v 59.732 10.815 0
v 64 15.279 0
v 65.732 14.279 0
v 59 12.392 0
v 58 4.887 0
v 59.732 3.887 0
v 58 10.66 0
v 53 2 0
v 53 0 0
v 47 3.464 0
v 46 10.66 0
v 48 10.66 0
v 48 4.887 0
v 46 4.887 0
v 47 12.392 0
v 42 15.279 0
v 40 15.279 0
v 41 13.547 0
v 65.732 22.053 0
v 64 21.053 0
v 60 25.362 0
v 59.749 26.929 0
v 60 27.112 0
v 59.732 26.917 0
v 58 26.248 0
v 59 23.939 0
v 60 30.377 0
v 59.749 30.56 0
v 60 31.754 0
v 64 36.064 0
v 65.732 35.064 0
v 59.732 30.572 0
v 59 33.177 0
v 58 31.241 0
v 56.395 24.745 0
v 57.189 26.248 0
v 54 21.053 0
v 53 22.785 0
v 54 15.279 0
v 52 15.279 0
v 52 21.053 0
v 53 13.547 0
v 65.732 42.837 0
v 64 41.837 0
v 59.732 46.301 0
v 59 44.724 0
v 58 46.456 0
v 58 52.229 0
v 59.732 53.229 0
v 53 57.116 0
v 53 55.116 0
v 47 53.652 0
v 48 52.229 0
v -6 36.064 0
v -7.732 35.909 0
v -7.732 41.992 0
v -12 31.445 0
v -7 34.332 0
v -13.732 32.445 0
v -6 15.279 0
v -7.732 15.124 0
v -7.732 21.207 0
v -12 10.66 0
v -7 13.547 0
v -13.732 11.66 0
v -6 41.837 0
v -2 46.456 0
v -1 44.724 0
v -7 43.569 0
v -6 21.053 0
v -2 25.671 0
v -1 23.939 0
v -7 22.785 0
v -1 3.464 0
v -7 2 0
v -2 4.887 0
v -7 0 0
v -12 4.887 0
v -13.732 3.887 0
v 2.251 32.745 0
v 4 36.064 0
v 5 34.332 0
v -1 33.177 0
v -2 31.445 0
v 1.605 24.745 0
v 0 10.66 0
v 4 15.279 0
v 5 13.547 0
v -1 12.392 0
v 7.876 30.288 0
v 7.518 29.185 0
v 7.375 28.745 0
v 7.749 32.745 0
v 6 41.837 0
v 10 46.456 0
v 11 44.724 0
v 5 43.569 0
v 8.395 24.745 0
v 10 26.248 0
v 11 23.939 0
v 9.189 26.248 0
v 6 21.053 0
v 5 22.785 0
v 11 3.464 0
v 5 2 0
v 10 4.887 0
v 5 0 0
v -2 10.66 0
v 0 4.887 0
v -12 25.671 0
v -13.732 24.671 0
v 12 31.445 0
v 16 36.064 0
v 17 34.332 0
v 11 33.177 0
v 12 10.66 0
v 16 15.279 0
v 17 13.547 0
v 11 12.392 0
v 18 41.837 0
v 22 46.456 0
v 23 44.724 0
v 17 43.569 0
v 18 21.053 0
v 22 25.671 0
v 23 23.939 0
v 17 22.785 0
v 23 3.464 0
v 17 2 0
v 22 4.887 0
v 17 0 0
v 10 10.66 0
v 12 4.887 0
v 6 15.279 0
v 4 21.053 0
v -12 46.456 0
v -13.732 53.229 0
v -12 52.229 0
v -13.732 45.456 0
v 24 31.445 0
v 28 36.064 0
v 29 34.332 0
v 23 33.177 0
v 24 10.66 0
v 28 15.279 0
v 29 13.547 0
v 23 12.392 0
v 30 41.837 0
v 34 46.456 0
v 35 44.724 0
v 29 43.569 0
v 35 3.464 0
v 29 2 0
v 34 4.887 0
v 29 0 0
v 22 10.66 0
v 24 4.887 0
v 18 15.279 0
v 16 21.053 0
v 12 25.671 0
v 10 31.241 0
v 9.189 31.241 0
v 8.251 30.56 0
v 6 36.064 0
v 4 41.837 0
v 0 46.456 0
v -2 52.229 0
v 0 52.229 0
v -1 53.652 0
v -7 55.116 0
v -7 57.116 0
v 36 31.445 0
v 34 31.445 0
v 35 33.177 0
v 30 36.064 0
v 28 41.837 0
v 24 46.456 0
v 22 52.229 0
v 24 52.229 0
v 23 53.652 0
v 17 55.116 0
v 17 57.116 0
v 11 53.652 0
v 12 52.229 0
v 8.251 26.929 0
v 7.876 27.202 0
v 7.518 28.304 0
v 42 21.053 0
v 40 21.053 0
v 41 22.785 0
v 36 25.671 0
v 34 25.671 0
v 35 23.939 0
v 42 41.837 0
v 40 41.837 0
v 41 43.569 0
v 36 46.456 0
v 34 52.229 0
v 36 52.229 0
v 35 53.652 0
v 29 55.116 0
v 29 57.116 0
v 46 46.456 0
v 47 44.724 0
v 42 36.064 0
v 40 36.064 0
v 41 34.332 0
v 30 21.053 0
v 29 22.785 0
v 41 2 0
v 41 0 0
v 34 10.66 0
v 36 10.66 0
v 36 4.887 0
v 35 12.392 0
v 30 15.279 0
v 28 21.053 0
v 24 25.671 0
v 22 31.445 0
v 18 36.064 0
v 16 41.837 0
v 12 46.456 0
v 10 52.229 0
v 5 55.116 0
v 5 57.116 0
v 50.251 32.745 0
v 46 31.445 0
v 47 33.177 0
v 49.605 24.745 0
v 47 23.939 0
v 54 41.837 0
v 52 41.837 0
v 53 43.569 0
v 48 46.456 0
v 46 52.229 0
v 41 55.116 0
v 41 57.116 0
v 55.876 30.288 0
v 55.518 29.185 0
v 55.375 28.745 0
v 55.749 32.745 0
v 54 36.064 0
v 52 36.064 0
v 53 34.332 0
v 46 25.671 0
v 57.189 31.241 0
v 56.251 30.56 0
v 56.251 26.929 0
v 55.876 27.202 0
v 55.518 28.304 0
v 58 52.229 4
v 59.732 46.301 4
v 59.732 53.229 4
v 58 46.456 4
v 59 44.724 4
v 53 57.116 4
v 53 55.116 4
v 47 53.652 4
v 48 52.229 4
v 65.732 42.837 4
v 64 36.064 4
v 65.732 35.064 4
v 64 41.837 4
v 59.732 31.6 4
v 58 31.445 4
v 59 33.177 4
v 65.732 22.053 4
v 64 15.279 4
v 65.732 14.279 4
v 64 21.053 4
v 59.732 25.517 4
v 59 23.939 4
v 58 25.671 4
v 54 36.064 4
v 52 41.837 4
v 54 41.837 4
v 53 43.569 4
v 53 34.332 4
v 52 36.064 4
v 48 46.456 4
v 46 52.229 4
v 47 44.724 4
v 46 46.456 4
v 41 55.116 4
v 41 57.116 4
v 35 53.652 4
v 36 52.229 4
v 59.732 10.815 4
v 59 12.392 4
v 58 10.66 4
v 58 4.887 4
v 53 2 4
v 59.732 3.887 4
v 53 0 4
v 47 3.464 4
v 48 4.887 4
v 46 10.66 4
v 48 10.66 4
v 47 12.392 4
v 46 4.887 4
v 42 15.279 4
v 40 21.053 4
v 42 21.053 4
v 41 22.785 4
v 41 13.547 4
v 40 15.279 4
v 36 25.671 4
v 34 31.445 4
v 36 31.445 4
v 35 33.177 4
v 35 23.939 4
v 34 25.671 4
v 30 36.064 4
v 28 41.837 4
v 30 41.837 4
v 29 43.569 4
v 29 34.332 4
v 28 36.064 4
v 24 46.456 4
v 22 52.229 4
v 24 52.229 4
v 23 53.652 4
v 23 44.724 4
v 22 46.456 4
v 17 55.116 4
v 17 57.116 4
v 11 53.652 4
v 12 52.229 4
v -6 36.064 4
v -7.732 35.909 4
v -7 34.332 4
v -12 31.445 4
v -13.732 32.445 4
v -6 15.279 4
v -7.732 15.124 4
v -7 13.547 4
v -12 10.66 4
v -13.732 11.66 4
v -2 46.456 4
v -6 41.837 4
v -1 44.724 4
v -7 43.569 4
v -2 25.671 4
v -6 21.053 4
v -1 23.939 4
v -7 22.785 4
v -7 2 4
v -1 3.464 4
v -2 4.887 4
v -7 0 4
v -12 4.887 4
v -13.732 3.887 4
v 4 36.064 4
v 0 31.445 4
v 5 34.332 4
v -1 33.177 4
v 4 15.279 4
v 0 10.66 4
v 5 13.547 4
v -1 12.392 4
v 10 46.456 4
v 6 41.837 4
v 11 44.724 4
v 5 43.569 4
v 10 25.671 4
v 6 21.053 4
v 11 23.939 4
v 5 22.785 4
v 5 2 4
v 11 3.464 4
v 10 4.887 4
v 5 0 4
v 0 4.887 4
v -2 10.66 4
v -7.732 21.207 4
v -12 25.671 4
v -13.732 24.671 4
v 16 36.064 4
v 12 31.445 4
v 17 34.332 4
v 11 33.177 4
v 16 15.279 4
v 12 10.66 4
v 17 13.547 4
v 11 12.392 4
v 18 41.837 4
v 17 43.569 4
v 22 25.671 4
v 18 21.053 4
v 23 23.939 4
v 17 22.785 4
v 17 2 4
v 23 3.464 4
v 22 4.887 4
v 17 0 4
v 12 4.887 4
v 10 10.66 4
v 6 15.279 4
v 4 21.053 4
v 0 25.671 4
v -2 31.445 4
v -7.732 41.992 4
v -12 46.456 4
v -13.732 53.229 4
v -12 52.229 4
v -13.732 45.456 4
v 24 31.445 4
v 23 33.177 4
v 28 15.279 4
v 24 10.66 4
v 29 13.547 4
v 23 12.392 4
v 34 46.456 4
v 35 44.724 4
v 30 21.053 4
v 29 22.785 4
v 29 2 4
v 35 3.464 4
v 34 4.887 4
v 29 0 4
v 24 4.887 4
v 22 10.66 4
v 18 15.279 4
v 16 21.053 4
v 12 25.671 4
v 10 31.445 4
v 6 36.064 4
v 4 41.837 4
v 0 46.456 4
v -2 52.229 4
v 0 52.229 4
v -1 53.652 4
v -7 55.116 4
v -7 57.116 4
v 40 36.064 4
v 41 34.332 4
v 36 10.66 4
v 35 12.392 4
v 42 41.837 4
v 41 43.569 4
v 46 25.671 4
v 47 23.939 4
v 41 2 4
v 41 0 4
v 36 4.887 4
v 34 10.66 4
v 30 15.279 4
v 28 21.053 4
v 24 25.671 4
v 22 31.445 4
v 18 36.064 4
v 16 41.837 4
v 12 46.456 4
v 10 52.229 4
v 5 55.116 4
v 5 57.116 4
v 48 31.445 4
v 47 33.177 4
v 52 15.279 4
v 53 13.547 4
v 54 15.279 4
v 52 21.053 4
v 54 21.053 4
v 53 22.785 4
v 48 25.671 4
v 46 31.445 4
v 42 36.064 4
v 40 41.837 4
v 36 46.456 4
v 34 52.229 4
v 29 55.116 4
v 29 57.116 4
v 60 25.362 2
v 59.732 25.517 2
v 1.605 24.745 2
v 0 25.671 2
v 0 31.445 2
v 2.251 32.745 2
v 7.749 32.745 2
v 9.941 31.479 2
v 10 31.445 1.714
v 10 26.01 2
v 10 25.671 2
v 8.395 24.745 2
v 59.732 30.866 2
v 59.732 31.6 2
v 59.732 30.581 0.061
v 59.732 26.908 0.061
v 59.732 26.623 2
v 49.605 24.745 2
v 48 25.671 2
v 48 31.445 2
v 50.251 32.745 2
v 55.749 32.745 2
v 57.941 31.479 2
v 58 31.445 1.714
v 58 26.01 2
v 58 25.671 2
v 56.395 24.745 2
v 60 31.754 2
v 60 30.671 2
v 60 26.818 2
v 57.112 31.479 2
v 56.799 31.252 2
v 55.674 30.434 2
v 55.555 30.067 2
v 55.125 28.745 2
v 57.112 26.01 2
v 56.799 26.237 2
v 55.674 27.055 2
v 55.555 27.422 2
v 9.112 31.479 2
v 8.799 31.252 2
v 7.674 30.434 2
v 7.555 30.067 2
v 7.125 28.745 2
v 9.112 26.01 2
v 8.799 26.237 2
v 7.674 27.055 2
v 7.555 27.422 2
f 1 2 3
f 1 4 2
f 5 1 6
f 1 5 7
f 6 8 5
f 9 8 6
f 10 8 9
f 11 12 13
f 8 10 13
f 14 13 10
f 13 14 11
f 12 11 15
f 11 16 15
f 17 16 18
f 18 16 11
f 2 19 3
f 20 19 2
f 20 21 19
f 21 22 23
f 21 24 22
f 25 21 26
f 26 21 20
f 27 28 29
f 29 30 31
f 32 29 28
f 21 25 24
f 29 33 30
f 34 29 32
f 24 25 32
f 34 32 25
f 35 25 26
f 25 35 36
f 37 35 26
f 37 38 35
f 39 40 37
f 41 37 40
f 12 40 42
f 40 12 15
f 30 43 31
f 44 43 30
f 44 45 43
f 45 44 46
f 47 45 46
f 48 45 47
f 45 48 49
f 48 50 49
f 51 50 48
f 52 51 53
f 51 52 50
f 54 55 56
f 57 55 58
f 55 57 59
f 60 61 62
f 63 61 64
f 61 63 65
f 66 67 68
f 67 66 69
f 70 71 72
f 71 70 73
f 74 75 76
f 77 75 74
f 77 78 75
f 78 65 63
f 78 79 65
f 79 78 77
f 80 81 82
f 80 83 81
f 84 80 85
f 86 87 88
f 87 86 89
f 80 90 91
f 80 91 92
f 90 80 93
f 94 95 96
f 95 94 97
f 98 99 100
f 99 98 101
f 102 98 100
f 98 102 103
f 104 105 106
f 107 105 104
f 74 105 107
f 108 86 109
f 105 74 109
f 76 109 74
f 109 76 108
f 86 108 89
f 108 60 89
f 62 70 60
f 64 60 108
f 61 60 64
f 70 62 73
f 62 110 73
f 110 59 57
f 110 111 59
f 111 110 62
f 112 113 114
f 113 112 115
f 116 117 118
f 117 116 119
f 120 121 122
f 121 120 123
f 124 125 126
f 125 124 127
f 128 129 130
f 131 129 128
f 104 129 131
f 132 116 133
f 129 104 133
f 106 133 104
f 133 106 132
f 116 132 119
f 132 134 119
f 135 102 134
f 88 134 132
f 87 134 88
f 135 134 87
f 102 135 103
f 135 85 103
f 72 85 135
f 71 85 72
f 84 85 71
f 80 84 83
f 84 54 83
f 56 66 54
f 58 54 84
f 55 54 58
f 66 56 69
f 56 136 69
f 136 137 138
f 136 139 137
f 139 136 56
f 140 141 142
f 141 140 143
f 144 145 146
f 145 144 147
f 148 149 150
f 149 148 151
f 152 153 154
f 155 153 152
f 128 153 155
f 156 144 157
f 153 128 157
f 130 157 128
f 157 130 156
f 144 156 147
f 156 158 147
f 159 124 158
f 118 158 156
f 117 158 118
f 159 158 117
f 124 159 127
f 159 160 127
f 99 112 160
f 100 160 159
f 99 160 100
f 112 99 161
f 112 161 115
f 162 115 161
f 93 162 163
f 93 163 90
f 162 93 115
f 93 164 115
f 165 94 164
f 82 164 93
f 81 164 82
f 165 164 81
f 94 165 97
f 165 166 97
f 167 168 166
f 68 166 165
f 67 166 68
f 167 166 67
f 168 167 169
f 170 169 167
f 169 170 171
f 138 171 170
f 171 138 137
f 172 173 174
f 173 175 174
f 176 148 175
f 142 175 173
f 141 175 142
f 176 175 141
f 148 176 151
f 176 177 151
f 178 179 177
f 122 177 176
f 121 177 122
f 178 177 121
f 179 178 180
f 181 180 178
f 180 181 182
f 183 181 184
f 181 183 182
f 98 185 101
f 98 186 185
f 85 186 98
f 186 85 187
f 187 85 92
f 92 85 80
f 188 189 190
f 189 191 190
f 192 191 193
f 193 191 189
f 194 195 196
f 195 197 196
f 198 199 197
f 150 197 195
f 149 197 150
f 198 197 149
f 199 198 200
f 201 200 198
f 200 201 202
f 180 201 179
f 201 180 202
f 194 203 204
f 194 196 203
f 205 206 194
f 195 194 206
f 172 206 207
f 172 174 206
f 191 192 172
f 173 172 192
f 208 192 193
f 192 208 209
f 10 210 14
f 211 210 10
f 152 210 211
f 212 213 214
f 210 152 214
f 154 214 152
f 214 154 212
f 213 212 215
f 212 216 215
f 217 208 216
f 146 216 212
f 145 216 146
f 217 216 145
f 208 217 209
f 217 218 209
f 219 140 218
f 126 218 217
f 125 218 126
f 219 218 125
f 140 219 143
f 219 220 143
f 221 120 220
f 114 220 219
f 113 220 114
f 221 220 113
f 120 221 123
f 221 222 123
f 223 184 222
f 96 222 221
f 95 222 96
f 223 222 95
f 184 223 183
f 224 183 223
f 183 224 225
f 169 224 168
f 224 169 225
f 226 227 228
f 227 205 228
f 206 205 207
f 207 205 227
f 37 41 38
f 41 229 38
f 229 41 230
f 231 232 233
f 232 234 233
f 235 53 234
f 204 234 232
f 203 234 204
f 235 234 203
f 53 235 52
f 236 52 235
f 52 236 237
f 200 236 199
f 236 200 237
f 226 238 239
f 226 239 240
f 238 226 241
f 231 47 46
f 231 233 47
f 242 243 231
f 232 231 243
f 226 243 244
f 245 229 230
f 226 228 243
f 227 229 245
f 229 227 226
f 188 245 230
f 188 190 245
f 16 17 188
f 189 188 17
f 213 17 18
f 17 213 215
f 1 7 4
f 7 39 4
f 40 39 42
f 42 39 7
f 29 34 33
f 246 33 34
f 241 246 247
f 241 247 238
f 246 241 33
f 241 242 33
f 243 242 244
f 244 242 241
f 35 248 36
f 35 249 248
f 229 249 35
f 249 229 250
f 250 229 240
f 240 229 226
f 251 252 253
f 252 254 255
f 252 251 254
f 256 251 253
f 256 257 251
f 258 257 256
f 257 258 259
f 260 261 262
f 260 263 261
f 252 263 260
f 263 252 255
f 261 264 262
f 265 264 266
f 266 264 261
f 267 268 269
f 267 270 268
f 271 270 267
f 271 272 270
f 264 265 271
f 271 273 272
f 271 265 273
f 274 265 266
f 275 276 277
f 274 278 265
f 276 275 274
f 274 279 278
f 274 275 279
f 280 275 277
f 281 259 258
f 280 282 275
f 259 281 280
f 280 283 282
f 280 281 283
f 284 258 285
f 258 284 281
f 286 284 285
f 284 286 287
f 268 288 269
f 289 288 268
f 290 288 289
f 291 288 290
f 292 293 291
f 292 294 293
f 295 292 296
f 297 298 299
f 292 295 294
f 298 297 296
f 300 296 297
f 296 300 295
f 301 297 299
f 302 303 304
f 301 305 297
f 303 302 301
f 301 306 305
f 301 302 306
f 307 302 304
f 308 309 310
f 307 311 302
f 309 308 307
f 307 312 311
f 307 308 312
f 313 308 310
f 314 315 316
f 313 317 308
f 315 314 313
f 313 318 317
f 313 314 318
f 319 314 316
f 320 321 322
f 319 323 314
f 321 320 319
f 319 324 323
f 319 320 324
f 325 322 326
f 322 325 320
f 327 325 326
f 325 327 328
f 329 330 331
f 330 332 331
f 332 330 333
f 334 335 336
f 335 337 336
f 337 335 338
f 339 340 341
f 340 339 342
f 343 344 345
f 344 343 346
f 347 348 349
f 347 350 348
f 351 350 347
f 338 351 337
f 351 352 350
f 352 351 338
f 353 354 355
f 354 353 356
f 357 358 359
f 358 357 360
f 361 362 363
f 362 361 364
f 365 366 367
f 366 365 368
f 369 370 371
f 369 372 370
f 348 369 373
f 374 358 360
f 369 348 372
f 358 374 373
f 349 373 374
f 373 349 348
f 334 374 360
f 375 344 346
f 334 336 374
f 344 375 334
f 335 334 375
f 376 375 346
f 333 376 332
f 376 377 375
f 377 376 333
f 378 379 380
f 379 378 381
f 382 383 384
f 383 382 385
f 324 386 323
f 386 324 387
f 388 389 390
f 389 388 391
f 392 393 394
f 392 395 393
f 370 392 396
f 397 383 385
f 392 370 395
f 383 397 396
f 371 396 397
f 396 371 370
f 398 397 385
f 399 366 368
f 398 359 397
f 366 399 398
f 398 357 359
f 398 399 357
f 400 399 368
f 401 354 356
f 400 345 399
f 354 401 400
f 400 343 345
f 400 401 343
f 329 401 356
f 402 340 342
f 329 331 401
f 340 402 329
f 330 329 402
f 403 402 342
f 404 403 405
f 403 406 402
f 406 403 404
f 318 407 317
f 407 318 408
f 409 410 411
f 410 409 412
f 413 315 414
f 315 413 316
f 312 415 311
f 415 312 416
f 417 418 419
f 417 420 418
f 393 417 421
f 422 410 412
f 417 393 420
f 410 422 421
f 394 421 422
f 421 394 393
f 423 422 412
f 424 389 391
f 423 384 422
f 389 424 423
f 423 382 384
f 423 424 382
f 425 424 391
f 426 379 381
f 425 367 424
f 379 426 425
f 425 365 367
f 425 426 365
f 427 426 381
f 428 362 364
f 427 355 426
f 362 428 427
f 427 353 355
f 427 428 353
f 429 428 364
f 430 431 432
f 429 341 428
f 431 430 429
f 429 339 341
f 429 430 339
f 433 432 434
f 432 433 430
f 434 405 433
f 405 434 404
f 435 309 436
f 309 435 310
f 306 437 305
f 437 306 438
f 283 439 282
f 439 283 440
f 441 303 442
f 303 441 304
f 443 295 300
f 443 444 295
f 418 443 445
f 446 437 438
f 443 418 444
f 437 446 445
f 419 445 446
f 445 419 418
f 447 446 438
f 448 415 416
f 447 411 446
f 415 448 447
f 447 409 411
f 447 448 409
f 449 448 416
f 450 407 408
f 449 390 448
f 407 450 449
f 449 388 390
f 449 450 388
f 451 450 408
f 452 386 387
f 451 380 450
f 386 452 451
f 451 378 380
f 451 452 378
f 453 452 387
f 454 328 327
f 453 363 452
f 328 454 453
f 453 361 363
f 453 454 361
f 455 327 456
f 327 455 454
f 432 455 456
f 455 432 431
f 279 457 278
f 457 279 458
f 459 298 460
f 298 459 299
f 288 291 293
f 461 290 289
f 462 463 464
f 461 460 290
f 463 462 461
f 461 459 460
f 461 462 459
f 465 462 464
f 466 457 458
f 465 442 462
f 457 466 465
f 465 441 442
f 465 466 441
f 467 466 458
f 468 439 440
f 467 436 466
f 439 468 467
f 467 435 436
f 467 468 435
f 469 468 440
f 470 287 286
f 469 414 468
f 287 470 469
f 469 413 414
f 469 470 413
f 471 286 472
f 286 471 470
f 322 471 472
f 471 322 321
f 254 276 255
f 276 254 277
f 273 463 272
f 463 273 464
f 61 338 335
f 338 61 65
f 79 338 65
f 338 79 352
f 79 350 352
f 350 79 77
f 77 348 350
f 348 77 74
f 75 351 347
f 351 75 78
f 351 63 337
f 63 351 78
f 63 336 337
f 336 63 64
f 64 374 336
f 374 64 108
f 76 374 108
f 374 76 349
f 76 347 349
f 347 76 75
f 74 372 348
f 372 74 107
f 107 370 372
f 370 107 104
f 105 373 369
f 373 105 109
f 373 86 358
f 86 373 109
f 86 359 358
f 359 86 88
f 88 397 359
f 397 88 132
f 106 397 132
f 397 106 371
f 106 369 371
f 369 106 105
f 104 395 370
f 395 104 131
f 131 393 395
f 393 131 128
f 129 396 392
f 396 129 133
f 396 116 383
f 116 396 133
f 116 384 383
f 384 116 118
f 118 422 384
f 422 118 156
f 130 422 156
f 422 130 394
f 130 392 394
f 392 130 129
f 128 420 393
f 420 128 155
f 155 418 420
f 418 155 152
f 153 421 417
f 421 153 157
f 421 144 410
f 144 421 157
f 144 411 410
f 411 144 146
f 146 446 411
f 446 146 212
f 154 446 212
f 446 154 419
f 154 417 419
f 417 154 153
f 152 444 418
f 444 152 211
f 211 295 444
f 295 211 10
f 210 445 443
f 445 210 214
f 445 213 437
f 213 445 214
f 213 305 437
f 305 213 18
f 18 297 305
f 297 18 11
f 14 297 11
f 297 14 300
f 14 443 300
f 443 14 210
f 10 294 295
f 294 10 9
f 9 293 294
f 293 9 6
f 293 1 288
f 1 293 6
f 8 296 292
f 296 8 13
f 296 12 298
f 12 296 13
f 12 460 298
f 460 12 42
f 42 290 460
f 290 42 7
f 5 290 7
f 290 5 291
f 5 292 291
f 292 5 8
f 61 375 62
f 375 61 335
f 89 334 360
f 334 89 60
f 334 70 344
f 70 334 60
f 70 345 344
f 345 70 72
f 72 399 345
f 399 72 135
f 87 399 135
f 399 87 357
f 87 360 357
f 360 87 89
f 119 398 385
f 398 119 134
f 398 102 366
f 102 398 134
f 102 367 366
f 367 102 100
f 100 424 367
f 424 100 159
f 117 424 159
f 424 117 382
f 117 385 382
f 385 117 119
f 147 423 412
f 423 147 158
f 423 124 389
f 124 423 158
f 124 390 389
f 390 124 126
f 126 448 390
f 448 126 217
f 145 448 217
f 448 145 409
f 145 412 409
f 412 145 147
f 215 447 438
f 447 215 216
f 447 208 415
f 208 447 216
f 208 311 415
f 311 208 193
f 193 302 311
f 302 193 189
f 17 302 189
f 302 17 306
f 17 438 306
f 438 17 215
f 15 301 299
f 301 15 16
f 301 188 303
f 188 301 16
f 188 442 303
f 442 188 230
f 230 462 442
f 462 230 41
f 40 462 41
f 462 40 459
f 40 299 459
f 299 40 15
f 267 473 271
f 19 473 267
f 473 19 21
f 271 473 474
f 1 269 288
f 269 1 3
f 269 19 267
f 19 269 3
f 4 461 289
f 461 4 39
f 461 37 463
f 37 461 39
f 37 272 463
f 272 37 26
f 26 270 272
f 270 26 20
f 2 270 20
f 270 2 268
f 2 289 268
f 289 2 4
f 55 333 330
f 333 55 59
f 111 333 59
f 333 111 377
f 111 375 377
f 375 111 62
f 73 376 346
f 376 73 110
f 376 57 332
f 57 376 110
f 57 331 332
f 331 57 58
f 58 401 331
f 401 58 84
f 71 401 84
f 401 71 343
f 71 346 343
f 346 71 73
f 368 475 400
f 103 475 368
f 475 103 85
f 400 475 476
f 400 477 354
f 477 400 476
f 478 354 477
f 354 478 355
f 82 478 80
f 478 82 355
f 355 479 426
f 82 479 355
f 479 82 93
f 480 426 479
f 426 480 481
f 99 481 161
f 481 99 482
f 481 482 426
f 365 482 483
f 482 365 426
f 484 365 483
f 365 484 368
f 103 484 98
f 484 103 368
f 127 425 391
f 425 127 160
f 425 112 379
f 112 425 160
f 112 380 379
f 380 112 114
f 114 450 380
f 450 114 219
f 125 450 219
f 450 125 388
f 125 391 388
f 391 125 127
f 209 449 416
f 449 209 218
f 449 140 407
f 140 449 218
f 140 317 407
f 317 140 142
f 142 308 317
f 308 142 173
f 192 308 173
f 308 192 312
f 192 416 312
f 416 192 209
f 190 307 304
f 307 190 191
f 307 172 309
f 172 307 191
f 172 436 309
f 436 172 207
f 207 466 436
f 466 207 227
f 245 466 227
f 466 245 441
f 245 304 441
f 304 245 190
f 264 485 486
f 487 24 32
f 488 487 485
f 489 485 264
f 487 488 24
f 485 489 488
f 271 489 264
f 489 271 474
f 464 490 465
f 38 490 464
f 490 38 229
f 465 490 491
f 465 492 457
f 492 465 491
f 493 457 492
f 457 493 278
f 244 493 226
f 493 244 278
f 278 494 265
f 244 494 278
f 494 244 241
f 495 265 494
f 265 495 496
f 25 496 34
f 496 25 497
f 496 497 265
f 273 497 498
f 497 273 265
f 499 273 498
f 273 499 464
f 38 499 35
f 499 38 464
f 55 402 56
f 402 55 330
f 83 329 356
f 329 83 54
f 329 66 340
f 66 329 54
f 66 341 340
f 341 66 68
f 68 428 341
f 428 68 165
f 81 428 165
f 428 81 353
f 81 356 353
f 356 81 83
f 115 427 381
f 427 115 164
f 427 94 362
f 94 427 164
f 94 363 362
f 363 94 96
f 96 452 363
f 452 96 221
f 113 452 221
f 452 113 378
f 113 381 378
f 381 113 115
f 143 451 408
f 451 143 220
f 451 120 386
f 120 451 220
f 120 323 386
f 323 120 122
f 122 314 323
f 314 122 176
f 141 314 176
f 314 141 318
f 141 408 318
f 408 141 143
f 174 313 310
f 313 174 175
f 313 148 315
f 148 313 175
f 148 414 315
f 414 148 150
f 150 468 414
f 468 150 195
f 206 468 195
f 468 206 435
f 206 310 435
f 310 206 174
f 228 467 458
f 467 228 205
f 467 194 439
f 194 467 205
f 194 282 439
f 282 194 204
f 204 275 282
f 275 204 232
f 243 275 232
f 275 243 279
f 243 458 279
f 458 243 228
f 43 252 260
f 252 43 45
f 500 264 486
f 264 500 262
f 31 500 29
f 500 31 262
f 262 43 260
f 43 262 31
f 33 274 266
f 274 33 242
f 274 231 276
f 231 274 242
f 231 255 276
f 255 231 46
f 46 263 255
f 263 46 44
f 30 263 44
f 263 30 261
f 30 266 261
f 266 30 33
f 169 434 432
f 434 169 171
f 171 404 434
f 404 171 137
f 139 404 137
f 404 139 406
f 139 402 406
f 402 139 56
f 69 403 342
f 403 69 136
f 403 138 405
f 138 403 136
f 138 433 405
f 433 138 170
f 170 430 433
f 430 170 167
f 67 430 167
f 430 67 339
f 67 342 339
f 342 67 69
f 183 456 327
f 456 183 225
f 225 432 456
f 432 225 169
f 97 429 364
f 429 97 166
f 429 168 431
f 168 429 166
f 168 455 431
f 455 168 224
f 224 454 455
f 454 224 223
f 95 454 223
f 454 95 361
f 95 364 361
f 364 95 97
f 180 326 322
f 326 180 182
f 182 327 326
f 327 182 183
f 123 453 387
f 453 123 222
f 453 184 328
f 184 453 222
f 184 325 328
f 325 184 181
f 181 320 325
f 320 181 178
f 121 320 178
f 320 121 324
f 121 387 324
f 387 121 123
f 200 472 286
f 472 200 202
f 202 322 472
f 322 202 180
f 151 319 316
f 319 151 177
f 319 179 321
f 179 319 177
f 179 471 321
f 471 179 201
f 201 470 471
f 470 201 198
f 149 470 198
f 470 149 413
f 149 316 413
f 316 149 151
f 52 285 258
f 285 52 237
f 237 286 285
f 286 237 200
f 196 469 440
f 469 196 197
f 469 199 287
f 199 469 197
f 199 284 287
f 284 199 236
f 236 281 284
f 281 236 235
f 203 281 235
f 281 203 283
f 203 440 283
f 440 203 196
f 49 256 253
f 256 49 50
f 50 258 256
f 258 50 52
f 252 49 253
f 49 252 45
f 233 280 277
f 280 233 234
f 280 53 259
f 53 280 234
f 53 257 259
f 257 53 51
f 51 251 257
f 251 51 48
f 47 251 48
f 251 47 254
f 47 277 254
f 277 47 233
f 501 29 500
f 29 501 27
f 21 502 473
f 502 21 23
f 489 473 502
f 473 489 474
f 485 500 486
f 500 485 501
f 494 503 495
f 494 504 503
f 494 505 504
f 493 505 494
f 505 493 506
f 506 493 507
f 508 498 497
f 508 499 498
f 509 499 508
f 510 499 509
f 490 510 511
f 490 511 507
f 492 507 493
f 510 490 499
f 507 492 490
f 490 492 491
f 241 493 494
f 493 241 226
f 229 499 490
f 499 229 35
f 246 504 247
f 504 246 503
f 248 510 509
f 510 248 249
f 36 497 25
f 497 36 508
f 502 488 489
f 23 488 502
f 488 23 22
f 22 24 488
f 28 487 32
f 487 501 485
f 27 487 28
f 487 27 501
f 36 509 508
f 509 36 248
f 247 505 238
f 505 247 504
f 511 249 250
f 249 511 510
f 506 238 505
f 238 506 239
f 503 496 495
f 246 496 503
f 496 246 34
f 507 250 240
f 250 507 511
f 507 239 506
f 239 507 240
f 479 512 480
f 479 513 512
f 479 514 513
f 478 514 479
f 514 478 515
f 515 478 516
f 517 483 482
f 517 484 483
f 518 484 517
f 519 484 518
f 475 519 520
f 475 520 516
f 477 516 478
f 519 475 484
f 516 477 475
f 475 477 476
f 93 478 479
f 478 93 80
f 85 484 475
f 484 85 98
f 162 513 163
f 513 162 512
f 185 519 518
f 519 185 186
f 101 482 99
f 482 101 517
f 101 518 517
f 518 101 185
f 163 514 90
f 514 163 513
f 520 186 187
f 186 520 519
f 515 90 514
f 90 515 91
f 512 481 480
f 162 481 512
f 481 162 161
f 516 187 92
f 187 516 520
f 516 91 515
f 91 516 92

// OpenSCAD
//------Created by Dsphar------//
//------Hope you find it usefull, for updates, see repo below------//
//https://github.com/Dsphar/openscad_honeycomb_shelf.git

//User Entered Values
numRows = 6;
numCols = 5;
wallThickness = 2;
minDiameter = 10;
height = 4;
tiltDeg = 0;
screwDiameter = 5;
screwHoleOffset = 3;
plateThickness = 2;

//Rectangle
buildCombRect(numRows,numCols);
//addMountingPlate(2, numRows, 2, numCols); //(row, numRows, col, numCols)
//addMountingPlate(2, numRows, 4, numCols); //(row, numRows, col, numCols)
//addMountingPlate(5, numRows, 3, numCols); //(row, numRows, col, numCols)

//Calculated Values
minRad = minDiameter/2;
minRadWall = minRad+wallThickness;
minDiam = minRadWall*2;
rad = 2*minRad / sqrt(3);
diam = rad*2;
evenRowBaseOffset = (minDiam-wallThickness)*cos(tiltDeg);

//modules
module buildCombRect(numRows, numColumns){
    for(col = [0:1:numColumns-1]){
        offsetCol(col)
        buildCol(numRows);
    }
}

module buildHex(){
    linear_extrude(height)
    translate([-minRad-wallThickness,rad+wallThickness,0])   
    rotate(30)
    difference(){
        circle(rad+wallThickness, $fn=6);
        circle(rad, $fn=6);
    };
}

module buildCol(size){  
    for(i = [0:1:size-1])   
        shiftObjectX(i)       
        tiltHex(tiltDeg)  
        buildHex();
}

module offsetCol(colNum){
    
    xShift = (colNum%2 == 0) ? 0 
        : (evenRowBaseOffset+(minDiam)*sin(tiltDeg)/tan(90-tiltDeg))/2;
    yShift = (colNum%2 == 0) ? colNum/2*(diam+rad+wallThickness*cos(30)*2) 
        : colNum*(diam-rad/2+wallThickness*cos(30));
        
    translate([xShift,yShift,0])
    {
        for(i=[0:$children-1])
        children(i);
    }
}

module shiftObjectX(units){
    translate([units*((minDiameter+wallThickness)*cos(tiltDeg)+(minDiameter+wallThickness)*sin(tiltDeg)/tan(90-tiltDeg)), 0, 0])
    {
        for(i=[0:$children-1])
          children(i);
    }
}

module  tiltHex(deg){
    rotate([0,deg,0]){
        for(i=[0:$children-1])
          children(i);
    }
}

module addMountingPlate(row, numRows, col,  numCols){
    place(numRows-row,numCols-col) 
    translate([-minDiam*cos(tiltDeg) - (minDiam)*sin(tiltDeg)/tan(90-tiltDeg)+wallThickness/2,(minDiameter+wallThickness)*.33,0])
    difference(){
        
        cube([minDiam*cos(tiltDeg) + (minDiam)*sin(tiltDeg)/tan(90-tiltDeg)-wallThickness/2,minRadWall+wallThickness/2,plateThickness]);
    
        translate([minDiam-screwHoleOffset, (minRadWall+wallThickness/2)/2, -1])
        cylinder(wallThickness+2, screwDiameter/2, screwDiameter/2+.5);
    }
}

module place(row,column){
    offsetCol(column)
    shiftObjectX(row)
    {
        for(i=[0:$children-1])
        children(i);
    }  
}

//Note: Everything below is a hack to allow Thingiverse Customizer
//users to add plates as they wish. I do not suggest you do it this
//way in OpenSCAD. Instead, just call addMountingPlate for every
//plate you want to add. See lines 18-20.

mountingPlatePositions = "1,3|5,3";//No spaces (row,col|row,col)
addMountingPlates(mountingPlatePositions);

module addMountingPlates(platesAsString){
    plates = [for(i = split("|", platesAsString)) split(",", i)];
    
    for(i = [0:len(plates)-1]){
        addMountingPlate(strToInt(plates[i][0]),numRows,strToInt(plates[i][1]),numCols);
    }
}

//courtesy of thingiverse.com/groups/openscad/forums/general/topic:10294
function substr(s, st, en, p="") =
    (st >= en || st >= len(s))
        ? p
        : substr(s, st+1, en, str(p, s[st]));
function split(h, s, p=[]) =
    let(x = search(h, s)) 
    x == []
        ? concat(p, s)
        : let(i=x[0], l=substr(s, 0, i), r=substr(s, i+1, len(s)))
                split(h, r, concat(p, l));

//courtesy of thingiverse.com/thing:202724/files    
function strToInt(str, base=10, i=0, nb=0) = (str[0] == "-") ? -1*_strToInt(str, base, 1) : _strToInt(str, base);
function _strToInt(str, base, i=0, nb=0) = (i == len(str)) ? nb : nb+_strToInt(str, base, i+1, search(str[i],"0123456789")[0]*pow(base,len(str)-i-1));
